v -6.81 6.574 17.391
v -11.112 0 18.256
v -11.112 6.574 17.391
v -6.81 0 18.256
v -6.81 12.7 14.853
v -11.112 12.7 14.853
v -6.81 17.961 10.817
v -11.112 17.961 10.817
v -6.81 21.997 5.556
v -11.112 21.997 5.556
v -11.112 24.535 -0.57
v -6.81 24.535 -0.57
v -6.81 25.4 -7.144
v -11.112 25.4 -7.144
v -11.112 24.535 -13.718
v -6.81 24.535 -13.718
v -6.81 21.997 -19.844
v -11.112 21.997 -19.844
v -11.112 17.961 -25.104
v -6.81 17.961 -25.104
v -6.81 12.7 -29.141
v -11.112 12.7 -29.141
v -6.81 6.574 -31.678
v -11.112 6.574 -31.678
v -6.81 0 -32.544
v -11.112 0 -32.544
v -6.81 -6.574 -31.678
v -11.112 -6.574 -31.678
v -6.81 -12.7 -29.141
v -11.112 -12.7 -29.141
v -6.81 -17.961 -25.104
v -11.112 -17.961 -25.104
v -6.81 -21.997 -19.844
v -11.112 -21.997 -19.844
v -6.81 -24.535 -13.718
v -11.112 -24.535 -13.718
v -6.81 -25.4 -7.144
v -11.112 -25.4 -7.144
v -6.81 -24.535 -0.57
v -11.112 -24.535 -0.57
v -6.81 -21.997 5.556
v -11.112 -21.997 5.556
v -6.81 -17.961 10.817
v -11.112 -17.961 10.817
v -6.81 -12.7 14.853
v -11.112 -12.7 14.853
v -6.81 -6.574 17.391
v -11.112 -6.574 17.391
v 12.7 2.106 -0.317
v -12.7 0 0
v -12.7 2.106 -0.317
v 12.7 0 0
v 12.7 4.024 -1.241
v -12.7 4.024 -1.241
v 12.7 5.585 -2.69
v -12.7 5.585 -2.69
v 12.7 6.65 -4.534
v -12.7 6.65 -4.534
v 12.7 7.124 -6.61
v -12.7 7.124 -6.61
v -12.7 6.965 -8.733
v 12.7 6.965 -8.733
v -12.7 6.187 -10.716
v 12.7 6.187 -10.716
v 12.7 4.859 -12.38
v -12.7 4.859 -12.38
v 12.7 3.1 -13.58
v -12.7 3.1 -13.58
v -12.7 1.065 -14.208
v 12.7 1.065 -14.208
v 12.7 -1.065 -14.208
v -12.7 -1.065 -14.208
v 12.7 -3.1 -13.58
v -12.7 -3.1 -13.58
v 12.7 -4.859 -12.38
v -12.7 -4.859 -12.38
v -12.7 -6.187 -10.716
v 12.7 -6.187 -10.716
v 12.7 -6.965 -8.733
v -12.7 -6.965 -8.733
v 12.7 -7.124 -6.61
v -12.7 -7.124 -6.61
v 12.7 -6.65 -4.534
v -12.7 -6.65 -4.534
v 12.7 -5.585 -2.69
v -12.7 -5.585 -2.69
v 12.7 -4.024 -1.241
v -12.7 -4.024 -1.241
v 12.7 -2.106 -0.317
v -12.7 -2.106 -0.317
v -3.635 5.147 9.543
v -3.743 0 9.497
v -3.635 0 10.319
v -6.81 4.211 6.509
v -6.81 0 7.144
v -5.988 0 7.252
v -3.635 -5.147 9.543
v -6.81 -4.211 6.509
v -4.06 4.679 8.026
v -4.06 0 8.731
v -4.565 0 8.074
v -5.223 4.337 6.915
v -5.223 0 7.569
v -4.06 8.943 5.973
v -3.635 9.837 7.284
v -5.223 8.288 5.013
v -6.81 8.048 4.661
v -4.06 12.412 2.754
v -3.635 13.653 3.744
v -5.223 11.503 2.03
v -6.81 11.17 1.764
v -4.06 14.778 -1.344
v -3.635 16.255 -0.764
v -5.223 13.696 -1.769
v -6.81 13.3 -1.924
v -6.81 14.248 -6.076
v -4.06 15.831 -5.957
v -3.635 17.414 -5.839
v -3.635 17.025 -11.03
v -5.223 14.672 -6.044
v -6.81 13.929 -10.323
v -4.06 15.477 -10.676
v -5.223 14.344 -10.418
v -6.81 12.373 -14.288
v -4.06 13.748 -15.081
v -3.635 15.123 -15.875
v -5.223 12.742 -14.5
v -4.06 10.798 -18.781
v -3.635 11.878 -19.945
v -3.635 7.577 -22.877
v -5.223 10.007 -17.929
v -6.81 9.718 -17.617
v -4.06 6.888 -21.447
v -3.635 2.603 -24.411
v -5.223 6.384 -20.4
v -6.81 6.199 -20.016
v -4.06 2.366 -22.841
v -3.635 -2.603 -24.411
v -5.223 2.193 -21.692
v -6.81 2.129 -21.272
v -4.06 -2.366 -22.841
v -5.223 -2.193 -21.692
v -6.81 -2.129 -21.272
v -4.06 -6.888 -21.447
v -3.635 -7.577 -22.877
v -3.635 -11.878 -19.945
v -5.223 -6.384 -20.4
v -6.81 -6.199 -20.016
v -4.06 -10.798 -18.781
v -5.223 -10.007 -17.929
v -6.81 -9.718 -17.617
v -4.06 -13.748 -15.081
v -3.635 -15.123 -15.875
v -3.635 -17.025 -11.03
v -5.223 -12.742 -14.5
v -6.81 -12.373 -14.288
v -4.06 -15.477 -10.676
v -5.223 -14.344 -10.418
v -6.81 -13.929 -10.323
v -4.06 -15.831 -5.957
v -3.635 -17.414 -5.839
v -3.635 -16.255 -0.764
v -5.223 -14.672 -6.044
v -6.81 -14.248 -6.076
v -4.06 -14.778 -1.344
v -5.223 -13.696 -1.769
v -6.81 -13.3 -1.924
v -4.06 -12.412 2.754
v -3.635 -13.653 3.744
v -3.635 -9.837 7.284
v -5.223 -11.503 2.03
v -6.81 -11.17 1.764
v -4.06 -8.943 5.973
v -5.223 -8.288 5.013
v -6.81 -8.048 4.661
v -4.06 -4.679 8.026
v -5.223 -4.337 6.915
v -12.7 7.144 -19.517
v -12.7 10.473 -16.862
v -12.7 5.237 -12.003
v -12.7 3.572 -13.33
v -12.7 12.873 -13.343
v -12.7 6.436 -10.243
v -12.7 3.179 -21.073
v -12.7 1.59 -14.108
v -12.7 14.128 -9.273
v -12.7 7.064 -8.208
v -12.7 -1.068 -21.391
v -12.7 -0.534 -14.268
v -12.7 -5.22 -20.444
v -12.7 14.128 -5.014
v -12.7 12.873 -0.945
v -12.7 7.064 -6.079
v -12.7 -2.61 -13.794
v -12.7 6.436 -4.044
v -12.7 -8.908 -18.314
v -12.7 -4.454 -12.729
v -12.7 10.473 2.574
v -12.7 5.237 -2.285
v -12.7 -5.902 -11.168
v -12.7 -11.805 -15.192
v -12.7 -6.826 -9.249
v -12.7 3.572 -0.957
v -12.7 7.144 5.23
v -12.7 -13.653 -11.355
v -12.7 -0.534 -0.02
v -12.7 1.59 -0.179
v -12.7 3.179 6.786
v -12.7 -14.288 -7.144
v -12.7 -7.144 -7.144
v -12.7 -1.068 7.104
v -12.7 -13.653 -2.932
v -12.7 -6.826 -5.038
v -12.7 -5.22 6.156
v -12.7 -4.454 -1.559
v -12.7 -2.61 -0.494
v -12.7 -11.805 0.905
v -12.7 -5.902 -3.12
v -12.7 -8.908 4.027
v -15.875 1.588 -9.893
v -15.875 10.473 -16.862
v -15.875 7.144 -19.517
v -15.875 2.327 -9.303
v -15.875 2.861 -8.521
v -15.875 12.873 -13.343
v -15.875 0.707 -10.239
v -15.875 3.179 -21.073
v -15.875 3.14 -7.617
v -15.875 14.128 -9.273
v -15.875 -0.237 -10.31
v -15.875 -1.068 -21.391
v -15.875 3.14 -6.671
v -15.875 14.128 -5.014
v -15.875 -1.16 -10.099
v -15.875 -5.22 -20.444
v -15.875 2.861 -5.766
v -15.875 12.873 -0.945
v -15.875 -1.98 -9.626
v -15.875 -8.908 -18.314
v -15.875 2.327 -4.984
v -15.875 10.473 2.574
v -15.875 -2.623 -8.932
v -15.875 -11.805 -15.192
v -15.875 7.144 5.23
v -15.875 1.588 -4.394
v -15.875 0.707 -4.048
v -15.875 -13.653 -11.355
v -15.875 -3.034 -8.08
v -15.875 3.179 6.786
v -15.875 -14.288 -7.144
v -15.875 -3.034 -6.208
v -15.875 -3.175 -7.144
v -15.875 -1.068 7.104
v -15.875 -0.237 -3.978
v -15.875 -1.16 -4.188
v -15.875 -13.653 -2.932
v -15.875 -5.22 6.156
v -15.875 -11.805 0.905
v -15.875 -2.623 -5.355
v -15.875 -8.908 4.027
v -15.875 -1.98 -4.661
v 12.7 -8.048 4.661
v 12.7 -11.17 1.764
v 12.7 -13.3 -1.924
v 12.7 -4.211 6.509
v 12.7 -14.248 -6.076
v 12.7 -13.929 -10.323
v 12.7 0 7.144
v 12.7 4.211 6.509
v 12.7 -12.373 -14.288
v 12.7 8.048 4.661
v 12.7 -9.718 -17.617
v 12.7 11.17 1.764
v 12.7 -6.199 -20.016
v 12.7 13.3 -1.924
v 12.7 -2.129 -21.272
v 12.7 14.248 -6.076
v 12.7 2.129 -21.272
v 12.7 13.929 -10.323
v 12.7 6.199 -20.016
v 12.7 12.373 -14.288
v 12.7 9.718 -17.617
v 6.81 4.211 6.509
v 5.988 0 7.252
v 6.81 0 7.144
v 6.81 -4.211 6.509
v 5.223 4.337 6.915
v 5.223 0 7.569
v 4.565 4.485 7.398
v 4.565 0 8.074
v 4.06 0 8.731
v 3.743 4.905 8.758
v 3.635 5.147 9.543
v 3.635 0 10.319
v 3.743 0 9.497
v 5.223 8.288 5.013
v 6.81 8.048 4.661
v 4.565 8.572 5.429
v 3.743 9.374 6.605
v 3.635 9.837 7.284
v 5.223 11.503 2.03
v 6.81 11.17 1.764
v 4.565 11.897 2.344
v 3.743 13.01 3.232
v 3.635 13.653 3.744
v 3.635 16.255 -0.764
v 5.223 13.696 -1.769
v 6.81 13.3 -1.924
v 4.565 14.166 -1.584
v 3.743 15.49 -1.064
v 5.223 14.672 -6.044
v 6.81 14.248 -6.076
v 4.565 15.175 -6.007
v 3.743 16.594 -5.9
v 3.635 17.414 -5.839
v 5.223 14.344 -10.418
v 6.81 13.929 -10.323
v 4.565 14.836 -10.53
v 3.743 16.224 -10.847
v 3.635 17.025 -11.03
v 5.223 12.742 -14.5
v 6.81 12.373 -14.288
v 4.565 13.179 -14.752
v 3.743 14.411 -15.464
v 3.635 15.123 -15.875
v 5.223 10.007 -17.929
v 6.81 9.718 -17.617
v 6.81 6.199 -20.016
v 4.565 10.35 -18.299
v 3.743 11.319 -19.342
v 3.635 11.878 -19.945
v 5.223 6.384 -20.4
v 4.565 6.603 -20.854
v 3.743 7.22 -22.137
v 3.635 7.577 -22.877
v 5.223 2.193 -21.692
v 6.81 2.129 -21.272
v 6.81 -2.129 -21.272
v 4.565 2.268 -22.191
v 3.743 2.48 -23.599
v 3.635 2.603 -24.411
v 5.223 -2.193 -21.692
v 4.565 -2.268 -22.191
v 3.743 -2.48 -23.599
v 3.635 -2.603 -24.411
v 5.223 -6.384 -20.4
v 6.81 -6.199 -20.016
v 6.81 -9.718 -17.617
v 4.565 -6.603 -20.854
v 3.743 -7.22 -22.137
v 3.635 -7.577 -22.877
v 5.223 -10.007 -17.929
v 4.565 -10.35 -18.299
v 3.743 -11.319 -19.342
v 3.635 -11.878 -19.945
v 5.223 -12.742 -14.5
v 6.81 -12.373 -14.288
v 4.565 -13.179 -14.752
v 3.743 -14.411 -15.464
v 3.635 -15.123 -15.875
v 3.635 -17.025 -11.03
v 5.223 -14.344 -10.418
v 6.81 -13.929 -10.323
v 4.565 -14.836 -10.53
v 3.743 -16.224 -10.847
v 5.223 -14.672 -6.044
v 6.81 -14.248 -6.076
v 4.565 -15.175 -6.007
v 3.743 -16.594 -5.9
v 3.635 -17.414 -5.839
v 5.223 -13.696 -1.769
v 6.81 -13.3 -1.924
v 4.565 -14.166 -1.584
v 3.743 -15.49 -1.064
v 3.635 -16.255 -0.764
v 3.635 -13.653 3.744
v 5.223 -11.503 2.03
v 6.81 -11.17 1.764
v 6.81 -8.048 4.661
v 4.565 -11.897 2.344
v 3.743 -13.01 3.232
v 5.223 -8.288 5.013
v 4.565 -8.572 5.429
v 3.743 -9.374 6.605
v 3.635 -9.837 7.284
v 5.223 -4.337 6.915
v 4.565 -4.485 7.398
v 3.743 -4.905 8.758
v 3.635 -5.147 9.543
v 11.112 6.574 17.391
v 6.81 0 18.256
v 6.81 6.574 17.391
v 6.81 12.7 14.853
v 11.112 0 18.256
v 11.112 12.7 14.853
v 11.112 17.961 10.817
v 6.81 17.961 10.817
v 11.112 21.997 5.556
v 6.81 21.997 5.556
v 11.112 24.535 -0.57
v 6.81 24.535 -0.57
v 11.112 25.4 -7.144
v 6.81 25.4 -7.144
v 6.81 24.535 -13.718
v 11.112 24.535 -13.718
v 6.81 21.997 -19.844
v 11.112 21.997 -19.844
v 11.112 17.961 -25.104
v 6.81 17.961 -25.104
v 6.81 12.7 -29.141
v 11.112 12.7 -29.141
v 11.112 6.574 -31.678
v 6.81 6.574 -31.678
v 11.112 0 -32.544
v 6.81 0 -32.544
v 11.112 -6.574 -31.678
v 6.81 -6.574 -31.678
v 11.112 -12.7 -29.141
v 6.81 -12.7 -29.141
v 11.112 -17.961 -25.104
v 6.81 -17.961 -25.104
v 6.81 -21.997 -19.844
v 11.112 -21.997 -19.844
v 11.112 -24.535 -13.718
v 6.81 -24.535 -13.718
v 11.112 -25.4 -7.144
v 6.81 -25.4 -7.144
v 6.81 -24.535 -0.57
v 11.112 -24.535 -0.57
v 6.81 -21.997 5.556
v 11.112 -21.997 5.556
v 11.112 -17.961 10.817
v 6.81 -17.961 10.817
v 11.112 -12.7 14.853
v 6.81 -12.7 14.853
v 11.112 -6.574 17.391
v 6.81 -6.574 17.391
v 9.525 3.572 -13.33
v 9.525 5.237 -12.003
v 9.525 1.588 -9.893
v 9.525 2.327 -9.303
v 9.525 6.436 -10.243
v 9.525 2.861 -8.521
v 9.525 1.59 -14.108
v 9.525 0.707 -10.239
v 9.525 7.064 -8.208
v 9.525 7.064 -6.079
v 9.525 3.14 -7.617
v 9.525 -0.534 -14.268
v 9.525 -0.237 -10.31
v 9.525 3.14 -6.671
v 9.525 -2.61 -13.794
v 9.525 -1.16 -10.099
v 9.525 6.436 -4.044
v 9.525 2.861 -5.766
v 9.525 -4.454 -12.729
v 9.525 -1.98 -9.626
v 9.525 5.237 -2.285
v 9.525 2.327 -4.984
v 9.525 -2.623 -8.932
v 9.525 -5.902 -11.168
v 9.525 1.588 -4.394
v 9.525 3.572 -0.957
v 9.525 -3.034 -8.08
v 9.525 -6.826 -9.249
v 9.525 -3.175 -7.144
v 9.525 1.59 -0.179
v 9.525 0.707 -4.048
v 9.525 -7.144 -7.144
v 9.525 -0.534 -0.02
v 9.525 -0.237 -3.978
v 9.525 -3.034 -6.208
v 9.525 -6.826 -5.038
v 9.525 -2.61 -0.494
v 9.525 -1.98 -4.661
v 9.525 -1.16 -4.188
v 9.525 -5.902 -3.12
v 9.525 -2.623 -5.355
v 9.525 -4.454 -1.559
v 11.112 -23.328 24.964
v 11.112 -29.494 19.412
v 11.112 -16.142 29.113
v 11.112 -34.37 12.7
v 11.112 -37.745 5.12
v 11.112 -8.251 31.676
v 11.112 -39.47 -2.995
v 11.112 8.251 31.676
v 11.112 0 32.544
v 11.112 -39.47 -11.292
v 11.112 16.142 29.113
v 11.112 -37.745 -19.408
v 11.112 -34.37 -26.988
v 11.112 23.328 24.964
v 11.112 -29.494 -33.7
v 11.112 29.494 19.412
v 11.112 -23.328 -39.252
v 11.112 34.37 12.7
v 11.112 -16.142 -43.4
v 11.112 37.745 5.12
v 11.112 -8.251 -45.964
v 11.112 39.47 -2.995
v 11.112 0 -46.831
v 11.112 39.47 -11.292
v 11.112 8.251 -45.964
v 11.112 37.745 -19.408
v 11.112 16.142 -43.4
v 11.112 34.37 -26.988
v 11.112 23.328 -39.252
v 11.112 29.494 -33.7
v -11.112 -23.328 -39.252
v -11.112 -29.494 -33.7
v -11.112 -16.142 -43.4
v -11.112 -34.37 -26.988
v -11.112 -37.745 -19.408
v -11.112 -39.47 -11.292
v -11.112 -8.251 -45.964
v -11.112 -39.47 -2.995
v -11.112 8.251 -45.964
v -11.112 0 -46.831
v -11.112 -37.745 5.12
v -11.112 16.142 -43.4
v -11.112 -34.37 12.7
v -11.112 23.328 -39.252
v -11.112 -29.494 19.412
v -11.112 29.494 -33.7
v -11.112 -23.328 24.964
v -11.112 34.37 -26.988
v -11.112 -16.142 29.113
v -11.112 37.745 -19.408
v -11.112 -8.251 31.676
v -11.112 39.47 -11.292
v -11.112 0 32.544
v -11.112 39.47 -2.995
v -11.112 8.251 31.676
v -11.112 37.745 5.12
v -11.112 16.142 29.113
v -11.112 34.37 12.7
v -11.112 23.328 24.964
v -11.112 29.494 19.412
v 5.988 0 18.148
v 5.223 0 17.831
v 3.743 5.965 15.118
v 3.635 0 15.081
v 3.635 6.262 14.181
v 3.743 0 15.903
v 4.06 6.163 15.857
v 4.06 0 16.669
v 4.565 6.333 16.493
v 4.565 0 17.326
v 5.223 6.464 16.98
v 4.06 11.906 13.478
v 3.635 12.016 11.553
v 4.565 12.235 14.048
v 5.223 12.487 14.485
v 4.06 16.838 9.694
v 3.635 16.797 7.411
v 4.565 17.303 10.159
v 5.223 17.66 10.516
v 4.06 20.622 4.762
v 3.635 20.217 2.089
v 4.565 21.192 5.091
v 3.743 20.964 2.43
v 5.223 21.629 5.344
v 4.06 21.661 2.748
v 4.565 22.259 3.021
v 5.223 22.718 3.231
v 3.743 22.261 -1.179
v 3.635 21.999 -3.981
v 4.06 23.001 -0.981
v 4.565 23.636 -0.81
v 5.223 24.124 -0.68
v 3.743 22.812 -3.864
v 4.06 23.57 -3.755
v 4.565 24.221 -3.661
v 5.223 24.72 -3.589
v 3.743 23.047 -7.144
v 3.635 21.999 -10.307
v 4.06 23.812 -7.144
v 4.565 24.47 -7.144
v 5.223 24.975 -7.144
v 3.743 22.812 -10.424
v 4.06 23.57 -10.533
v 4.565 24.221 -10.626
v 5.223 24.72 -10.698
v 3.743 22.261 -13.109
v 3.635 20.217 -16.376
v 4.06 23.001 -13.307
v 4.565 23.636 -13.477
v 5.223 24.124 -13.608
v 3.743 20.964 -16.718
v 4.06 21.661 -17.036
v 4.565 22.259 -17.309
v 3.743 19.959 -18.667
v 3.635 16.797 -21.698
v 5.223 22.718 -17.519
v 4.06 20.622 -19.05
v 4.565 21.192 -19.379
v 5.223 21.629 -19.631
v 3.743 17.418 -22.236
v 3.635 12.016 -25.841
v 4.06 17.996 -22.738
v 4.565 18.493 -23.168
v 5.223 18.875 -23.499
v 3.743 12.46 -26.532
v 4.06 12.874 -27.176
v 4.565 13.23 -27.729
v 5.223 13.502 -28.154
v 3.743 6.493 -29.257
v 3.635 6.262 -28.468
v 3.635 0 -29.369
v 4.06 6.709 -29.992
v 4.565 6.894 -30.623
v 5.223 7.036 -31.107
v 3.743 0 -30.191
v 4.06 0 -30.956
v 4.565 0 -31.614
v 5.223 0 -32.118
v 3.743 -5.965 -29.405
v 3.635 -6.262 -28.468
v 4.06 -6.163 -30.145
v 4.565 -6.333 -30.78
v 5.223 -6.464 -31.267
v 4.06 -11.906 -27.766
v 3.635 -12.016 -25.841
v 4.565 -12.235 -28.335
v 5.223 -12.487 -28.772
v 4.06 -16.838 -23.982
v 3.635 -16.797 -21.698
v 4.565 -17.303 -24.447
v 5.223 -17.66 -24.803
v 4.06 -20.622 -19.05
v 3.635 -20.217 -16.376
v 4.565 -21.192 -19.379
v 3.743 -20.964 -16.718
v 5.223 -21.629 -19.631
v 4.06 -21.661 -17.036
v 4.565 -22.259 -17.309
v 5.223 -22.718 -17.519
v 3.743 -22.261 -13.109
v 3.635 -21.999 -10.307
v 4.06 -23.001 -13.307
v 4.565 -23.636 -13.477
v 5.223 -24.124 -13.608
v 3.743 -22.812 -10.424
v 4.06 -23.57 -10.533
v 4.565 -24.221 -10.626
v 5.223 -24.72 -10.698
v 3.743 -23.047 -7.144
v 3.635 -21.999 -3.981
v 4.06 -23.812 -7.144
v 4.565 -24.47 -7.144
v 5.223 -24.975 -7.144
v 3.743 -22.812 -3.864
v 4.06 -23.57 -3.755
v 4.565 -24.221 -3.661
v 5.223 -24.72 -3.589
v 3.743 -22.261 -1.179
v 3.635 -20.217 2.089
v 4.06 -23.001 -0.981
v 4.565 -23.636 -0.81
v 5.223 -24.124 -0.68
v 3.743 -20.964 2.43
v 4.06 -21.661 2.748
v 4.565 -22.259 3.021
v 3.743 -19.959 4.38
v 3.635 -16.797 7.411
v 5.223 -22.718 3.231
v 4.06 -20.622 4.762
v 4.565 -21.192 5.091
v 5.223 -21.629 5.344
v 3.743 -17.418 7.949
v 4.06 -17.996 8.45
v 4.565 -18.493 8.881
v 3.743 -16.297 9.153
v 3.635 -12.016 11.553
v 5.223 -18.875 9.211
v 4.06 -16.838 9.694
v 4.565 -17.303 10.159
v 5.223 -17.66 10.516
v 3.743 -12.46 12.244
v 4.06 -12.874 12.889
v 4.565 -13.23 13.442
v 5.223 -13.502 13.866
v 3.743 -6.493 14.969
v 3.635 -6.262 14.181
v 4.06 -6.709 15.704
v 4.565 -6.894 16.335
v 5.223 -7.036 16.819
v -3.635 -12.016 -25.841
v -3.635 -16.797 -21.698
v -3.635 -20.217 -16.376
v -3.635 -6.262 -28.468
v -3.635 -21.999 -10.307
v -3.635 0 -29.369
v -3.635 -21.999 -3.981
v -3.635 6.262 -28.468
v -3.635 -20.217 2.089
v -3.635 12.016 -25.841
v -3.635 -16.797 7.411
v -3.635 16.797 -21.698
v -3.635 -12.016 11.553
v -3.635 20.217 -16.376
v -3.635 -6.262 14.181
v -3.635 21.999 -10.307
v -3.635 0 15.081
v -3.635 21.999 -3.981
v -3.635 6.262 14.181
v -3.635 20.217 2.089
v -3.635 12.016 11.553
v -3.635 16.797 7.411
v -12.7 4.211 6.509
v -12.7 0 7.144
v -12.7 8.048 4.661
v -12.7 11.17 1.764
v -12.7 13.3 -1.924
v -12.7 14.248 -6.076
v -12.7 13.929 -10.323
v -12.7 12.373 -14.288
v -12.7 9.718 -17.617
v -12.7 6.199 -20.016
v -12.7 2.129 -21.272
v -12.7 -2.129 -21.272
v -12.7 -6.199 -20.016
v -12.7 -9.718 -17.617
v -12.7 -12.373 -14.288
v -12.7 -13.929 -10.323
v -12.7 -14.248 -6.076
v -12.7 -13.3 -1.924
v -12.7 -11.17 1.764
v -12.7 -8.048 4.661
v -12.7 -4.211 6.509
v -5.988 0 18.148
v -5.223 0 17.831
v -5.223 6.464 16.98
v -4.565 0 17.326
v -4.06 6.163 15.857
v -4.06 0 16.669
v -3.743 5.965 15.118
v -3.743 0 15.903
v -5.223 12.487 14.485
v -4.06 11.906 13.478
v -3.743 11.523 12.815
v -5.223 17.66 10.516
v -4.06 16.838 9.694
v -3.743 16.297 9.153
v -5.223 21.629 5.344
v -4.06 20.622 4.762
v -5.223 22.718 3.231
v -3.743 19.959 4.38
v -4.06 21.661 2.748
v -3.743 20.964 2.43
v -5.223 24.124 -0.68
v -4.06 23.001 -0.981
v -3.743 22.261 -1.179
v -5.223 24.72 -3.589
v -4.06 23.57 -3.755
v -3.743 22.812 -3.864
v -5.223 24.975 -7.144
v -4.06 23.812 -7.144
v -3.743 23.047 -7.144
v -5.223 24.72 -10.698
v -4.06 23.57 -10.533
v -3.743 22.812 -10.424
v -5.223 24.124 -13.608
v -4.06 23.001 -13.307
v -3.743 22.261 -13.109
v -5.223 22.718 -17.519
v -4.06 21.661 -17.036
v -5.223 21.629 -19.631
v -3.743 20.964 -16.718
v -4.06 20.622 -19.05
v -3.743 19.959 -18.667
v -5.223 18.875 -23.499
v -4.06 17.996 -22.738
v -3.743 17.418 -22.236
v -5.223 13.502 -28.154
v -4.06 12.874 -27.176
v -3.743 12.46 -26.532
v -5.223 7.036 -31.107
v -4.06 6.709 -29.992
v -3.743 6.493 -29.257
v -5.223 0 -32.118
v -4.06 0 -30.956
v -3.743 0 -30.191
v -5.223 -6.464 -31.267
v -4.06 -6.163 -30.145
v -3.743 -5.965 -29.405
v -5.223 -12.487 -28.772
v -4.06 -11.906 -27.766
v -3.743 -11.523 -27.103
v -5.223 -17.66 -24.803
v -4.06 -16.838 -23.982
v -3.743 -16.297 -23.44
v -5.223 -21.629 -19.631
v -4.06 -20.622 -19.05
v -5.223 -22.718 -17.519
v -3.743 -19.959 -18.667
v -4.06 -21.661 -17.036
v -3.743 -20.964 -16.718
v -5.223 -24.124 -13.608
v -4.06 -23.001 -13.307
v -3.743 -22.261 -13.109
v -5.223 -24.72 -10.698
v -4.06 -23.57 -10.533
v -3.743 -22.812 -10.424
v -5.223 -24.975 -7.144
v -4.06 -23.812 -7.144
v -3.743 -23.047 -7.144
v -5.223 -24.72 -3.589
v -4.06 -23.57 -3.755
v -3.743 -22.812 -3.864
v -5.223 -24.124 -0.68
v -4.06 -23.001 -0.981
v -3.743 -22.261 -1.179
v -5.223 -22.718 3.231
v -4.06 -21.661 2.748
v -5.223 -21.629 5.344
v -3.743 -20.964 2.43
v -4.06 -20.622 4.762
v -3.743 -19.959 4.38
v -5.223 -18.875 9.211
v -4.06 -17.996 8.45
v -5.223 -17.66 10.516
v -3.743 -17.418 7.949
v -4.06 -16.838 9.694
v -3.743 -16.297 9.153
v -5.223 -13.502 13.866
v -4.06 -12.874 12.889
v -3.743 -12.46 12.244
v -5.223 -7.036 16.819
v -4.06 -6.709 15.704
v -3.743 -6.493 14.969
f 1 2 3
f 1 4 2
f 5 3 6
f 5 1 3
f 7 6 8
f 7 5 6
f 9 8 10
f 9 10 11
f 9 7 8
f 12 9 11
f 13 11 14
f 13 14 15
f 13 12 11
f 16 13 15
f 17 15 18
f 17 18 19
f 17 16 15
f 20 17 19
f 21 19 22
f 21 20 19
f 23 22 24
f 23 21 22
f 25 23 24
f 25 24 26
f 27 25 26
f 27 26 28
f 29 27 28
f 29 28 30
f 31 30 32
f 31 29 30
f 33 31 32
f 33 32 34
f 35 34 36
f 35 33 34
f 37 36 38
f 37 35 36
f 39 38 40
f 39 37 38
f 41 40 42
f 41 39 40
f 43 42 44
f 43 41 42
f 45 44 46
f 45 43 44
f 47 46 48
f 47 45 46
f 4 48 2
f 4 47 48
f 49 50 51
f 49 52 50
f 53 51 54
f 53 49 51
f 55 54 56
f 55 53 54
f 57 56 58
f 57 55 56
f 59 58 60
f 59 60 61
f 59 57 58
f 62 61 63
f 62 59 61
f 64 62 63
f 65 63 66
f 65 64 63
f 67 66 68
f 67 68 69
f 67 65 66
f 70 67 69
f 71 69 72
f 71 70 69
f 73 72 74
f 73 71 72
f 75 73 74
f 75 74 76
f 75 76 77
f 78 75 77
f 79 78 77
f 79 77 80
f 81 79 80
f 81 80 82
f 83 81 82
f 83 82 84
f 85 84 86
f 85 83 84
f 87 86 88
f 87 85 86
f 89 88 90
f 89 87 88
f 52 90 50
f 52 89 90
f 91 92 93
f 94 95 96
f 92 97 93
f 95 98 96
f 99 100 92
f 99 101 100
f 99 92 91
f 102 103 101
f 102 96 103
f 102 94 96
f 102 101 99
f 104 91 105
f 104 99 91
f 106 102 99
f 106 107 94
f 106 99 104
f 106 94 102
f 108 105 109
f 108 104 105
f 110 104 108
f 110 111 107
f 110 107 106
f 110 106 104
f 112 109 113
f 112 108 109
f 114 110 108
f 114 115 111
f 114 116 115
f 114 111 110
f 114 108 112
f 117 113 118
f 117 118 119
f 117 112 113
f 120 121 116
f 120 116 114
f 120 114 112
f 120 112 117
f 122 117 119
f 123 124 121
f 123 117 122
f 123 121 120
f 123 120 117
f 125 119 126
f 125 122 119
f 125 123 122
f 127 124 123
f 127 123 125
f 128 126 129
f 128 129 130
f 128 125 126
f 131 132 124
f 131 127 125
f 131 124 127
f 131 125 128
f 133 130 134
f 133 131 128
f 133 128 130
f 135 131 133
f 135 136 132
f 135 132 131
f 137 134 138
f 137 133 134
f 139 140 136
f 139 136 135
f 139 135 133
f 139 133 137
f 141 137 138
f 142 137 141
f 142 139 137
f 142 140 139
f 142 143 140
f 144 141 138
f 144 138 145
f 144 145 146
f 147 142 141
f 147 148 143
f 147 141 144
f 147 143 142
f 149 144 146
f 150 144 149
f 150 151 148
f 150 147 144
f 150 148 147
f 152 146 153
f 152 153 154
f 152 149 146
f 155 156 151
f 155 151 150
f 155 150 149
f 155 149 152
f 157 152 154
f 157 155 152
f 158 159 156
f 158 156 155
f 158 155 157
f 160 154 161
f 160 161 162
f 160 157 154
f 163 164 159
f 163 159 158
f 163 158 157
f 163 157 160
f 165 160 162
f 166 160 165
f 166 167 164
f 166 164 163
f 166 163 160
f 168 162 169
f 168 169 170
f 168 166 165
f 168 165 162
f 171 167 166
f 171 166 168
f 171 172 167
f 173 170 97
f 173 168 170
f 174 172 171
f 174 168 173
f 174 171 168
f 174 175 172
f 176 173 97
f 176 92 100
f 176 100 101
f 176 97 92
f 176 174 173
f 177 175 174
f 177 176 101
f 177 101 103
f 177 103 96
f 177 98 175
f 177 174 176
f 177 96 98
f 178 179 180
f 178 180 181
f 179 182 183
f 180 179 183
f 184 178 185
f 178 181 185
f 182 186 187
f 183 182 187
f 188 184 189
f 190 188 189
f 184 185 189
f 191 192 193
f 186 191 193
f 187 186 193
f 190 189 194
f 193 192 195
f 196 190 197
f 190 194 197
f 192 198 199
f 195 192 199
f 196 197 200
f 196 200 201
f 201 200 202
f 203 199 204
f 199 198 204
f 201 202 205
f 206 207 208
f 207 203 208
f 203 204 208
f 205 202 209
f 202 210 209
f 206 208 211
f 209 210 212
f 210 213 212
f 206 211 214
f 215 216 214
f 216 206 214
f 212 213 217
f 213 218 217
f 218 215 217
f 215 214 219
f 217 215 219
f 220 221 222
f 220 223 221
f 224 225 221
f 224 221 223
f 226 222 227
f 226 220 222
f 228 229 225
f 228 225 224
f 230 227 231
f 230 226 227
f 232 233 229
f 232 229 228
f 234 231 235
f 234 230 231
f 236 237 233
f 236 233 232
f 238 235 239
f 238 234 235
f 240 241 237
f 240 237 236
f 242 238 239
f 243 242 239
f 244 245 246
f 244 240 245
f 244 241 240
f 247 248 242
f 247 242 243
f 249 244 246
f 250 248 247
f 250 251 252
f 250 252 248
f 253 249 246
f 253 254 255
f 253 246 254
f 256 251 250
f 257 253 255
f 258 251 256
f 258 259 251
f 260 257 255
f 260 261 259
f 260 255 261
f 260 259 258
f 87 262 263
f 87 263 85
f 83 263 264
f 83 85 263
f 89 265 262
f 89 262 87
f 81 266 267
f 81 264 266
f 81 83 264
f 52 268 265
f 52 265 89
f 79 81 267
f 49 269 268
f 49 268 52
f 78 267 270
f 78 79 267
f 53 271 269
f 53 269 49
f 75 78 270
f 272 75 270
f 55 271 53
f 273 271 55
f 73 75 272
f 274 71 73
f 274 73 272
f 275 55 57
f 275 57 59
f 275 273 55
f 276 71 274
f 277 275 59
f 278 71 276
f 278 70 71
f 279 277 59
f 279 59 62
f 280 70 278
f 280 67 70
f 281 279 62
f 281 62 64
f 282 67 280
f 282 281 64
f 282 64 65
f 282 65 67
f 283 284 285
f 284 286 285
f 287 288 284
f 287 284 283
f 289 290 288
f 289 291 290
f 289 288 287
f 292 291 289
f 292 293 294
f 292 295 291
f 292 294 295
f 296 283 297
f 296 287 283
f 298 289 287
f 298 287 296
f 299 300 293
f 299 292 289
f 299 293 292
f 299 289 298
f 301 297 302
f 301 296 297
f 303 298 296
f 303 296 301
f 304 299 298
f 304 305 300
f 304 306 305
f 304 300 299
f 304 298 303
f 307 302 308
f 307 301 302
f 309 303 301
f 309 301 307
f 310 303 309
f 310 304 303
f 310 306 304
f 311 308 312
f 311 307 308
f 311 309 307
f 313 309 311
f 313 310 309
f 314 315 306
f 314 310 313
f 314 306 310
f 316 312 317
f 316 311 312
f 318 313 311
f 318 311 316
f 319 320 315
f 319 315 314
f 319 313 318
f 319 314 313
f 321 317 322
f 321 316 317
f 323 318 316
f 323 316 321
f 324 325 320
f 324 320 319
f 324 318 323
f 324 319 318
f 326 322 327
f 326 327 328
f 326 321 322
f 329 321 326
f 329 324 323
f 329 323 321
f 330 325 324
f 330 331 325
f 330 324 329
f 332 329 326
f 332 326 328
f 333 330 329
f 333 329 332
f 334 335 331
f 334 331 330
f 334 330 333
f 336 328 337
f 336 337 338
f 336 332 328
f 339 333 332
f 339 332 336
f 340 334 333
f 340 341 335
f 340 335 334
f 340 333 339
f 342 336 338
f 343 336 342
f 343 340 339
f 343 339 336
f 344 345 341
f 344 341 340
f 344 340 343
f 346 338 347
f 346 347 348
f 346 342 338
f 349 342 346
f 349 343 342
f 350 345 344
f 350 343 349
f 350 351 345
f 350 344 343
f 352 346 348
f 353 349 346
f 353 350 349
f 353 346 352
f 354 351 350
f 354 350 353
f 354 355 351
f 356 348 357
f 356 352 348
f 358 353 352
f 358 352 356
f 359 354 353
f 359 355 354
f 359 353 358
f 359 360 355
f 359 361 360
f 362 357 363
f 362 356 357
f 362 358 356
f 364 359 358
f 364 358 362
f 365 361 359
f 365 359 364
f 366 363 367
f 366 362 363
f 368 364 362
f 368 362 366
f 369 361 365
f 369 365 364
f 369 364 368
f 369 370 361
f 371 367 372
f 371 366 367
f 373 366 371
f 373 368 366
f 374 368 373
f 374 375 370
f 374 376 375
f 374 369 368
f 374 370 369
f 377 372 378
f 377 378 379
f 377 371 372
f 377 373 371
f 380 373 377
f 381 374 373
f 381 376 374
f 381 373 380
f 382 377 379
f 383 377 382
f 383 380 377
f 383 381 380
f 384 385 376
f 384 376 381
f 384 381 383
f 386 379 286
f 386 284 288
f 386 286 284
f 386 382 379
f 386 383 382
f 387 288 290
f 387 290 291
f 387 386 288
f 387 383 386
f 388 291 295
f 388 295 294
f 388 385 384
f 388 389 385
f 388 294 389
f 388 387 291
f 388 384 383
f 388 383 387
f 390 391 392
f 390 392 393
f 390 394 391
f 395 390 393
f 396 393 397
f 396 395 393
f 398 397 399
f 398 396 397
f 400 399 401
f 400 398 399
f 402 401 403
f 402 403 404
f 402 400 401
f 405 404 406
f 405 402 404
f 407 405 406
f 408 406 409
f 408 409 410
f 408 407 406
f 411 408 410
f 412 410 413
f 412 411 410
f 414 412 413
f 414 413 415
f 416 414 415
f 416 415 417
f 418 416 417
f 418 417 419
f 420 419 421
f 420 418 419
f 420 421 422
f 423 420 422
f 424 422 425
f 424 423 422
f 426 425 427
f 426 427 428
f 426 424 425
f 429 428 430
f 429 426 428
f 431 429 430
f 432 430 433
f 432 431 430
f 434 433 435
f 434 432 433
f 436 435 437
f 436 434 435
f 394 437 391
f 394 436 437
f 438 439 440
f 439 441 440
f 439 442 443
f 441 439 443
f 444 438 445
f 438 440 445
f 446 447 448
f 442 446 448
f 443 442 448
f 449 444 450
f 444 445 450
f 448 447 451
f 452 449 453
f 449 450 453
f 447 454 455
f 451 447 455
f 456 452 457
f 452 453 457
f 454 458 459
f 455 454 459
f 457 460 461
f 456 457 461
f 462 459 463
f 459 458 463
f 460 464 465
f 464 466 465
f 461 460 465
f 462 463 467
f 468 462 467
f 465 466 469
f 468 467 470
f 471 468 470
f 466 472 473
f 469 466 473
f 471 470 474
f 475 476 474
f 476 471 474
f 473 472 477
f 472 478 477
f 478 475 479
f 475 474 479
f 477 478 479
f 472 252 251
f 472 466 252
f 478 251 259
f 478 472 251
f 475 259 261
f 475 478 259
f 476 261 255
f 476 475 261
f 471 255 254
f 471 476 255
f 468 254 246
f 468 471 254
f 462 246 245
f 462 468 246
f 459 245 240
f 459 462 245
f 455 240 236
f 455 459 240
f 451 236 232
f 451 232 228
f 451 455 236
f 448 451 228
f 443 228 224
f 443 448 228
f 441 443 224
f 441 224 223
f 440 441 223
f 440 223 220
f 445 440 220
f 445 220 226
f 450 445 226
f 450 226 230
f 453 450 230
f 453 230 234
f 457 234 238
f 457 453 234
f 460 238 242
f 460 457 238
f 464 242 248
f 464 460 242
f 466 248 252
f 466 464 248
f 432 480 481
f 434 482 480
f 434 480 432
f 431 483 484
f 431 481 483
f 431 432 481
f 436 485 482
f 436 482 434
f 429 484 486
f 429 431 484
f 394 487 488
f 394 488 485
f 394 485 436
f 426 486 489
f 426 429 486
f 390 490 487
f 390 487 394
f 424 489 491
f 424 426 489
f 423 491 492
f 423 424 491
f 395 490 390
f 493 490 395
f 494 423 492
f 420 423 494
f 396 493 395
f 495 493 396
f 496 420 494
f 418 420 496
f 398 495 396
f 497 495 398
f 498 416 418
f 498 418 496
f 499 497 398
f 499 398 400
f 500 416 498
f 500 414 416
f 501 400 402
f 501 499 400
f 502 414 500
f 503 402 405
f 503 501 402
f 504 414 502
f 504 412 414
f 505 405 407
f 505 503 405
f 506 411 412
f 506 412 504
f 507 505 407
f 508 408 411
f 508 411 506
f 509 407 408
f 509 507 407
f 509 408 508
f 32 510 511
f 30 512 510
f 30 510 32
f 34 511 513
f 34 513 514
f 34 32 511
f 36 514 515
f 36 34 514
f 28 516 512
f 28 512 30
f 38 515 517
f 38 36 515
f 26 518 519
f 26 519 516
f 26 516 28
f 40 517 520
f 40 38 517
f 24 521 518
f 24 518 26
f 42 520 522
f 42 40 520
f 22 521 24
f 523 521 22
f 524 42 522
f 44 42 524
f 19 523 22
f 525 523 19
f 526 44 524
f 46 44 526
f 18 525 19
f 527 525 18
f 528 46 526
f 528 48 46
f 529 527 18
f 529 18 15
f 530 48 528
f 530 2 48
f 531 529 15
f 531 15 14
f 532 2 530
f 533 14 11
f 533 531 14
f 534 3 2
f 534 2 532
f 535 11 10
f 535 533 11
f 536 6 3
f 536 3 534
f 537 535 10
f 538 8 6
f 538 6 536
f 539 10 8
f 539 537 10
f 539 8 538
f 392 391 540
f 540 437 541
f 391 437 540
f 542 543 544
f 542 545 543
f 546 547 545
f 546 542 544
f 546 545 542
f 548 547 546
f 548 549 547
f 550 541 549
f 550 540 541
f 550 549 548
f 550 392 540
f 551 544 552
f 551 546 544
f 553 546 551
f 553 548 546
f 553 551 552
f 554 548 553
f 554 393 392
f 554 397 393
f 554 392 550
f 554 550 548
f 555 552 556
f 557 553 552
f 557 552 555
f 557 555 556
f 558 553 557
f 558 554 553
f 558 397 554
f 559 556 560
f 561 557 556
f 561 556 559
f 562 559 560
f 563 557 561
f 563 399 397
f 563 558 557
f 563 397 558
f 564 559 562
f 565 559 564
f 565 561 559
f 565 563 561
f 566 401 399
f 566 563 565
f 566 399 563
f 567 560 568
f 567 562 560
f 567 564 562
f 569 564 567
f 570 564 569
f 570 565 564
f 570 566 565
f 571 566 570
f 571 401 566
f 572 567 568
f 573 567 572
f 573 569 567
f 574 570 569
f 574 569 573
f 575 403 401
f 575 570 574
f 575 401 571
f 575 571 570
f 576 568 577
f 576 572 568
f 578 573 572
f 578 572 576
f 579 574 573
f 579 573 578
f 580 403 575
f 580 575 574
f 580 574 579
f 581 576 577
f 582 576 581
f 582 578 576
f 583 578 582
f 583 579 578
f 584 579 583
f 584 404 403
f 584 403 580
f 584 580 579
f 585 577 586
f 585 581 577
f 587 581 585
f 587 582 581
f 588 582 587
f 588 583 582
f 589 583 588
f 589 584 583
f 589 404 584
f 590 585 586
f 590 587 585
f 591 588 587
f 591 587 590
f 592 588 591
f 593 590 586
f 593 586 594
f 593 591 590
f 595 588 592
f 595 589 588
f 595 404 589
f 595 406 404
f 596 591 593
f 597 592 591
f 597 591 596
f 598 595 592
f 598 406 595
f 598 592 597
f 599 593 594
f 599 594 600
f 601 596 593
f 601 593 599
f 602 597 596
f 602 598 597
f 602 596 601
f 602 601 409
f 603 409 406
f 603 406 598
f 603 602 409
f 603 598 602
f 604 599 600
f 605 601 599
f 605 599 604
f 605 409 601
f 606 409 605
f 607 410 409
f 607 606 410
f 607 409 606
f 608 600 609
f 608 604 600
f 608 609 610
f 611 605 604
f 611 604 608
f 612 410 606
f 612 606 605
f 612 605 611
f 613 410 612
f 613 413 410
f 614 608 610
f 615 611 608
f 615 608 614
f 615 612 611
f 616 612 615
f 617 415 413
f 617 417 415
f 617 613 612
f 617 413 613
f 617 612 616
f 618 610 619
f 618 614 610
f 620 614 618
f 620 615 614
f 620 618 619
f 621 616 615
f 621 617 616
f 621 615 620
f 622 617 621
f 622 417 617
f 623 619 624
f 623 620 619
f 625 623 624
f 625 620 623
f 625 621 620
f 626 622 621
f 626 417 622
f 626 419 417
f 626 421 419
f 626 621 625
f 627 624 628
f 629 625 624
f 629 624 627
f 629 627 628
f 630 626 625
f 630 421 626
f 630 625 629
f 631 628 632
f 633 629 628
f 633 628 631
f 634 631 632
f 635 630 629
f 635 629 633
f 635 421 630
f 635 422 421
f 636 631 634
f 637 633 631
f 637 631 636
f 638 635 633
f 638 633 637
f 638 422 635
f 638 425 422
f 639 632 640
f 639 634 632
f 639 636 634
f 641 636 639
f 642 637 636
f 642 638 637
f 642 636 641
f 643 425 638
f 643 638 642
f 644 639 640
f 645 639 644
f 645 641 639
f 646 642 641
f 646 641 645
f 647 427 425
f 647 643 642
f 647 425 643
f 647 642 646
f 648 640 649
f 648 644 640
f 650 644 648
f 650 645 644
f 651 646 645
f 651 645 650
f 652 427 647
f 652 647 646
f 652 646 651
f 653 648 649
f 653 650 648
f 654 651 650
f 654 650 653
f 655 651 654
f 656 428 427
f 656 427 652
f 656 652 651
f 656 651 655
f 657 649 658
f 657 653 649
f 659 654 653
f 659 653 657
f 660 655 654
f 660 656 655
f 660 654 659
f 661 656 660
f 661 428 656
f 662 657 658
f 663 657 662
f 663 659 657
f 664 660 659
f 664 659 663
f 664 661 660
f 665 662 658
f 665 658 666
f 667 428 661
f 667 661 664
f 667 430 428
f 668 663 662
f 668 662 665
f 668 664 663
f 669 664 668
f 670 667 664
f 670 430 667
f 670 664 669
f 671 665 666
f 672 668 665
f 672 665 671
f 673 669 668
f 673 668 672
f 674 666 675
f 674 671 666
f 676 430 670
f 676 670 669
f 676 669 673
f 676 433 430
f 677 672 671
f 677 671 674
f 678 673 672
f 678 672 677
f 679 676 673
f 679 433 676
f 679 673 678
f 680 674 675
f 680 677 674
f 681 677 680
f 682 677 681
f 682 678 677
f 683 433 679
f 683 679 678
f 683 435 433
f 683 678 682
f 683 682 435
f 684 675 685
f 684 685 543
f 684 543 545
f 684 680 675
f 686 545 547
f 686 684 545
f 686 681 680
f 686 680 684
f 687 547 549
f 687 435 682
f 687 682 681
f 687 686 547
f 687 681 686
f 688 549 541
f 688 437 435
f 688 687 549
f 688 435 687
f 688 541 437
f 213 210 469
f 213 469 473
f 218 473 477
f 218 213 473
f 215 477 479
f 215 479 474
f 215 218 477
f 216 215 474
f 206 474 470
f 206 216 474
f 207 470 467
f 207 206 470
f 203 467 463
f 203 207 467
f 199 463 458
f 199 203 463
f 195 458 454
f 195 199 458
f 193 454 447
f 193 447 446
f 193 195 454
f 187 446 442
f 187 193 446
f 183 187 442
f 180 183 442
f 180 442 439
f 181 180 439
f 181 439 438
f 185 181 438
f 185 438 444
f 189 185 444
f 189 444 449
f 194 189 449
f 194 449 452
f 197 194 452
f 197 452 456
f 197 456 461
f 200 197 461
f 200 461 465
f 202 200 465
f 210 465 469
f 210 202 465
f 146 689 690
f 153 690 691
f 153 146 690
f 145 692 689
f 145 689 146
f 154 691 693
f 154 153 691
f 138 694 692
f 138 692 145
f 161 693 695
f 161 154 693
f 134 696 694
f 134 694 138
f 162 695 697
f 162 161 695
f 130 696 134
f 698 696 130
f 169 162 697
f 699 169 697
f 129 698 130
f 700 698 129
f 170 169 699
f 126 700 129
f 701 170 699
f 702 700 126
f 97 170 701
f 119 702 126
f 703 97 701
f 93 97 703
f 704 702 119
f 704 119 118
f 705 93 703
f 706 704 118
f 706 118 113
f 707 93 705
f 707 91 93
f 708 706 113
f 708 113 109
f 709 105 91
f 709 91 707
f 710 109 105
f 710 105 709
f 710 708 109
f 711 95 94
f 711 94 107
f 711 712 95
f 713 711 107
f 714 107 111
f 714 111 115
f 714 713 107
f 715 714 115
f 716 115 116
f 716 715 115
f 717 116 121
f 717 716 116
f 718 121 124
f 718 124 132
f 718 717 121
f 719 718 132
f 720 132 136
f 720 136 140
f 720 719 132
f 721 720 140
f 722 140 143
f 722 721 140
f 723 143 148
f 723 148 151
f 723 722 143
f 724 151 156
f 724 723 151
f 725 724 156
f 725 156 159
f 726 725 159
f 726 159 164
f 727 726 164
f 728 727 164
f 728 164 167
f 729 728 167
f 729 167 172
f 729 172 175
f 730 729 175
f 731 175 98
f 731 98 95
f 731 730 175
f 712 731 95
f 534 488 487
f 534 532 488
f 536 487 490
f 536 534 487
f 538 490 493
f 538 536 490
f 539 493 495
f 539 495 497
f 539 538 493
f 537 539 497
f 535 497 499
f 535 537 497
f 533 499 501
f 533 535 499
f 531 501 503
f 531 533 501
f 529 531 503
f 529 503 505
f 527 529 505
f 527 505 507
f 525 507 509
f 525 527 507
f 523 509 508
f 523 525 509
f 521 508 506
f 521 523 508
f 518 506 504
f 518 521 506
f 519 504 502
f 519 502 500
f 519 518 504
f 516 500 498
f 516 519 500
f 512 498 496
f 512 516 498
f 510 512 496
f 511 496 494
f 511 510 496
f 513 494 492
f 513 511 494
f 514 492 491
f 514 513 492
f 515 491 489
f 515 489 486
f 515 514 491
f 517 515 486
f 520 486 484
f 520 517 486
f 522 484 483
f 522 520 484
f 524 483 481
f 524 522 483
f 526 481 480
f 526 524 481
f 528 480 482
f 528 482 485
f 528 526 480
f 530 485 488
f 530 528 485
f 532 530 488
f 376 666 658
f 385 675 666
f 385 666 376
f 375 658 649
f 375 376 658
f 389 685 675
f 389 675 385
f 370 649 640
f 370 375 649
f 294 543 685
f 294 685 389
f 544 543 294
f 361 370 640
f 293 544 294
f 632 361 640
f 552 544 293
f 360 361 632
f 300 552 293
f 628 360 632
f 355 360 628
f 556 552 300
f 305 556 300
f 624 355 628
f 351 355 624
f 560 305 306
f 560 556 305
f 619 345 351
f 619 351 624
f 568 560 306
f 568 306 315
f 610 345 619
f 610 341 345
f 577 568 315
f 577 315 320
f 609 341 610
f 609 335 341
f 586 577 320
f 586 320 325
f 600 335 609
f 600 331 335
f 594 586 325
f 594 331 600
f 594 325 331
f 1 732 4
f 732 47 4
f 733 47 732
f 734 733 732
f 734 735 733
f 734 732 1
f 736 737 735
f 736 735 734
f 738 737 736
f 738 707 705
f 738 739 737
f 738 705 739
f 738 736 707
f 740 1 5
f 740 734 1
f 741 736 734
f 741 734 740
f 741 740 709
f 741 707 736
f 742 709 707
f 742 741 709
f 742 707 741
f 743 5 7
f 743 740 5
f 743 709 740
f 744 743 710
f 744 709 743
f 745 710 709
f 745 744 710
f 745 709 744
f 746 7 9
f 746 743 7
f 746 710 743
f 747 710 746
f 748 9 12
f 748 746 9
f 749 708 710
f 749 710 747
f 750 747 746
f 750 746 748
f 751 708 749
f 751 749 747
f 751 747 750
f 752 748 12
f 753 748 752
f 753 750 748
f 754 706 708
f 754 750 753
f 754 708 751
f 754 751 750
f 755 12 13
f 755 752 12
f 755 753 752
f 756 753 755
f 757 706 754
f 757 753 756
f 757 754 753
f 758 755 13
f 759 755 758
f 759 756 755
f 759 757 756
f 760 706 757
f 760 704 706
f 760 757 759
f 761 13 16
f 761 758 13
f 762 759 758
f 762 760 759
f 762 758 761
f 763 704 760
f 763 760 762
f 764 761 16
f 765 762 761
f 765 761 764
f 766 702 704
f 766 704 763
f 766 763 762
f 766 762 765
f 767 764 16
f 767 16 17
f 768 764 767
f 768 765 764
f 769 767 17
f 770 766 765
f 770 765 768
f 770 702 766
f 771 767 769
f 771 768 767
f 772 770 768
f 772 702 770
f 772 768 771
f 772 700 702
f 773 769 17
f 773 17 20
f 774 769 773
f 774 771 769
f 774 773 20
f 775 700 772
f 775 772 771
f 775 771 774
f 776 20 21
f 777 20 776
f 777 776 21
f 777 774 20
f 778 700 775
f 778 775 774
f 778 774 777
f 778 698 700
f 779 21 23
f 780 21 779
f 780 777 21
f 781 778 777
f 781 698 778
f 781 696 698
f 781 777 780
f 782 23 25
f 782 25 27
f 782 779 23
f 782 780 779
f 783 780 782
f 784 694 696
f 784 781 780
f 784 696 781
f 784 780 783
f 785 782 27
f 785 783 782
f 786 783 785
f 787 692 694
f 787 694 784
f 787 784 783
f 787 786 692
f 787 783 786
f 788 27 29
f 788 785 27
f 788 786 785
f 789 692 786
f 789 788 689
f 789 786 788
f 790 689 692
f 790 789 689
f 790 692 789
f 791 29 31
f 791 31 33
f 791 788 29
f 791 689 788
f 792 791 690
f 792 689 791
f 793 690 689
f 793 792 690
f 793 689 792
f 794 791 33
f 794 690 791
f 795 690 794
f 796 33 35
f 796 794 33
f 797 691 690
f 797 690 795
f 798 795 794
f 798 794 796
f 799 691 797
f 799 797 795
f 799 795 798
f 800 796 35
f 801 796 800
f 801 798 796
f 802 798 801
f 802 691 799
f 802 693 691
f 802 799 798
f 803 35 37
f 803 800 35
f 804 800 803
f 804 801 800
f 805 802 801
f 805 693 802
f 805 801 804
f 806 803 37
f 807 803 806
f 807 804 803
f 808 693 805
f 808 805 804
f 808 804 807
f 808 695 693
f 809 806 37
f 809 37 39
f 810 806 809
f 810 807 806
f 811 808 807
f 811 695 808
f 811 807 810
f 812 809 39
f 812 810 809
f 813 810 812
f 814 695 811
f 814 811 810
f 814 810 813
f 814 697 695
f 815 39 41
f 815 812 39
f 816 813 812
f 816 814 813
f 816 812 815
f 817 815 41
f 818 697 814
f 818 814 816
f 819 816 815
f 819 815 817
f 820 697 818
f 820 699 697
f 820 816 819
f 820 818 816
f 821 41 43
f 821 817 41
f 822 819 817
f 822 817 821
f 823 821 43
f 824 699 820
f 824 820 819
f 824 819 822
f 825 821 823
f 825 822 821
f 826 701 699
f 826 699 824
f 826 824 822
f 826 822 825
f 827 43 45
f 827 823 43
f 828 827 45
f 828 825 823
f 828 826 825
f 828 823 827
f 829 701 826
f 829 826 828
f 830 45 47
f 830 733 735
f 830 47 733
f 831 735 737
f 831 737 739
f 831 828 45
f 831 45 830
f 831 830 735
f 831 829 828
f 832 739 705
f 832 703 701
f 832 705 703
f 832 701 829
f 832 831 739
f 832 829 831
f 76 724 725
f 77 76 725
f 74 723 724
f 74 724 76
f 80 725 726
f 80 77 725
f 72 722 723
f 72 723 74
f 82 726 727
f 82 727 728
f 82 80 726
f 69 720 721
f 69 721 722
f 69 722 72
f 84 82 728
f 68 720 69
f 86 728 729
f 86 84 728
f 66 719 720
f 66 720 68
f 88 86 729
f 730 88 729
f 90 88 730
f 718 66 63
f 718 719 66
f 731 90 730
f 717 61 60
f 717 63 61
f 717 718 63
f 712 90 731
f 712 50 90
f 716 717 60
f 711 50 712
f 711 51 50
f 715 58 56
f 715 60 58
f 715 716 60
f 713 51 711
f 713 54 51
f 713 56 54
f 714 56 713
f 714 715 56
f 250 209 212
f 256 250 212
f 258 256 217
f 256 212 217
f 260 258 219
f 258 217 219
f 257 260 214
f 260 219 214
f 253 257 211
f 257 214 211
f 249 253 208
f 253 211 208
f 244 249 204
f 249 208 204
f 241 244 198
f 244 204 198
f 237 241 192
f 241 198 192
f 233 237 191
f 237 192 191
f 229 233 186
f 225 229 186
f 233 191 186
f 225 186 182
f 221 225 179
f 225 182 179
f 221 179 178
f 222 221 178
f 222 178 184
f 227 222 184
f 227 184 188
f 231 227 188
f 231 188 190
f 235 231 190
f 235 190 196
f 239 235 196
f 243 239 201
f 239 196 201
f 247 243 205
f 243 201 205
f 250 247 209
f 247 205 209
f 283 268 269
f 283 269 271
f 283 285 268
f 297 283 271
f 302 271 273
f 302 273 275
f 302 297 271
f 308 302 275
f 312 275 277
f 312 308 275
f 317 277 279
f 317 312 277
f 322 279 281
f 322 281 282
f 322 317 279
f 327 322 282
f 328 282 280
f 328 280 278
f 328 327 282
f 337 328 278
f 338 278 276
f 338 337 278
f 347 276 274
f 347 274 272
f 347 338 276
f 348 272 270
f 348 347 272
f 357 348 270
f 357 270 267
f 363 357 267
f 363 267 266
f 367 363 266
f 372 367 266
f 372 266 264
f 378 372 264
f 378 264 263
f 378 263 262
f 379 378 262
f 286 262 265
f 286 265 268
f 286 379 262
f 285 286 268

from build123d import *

# Parameters (mm, degrees)
F2_R        = 7.14375
F2_R_2      = 3.175
F3_DEPTH    = 22.225
F1_FACE_R   = 14.2875
F1_FACE_R_2 = 7.14375
F3_FACE_R   = 7.14375
F3_FACE_R_2 = 3.175
F4_DEPTH    = 3.175


with BuildPart() as f1:
    # F0 (on Front) → F1 (revolve)
    with BuildSketch(Plane.XZ):
        with BuildLine():
            Line((-12.7, 0), (0, 0))
            Line((0, 0), (0, 32.54375))
            Line((0, 32.54375), (-11.1125, 32.54375))
            Line((-11.1125, 32.54375), (-11.1125, 18.25625))
            Line((-11.1125, 18.25625), (-6.8100053257, 18.25625))
            ThreePointArc((-6.8100053257, 18.25625), (-4.5649412955, 17.3263140303), (-3.6350053257, 15.08125))
            Line((-3.6350053257, 15.08125), (-3.6350053257, 10.31875))
            ThreePointArc((-3.6350053257, 10.31875), (-4.5649412955, 8.0736859697), (-6.8100053257, 7.14375))
            Line((-6.8100053257, 7.14375), (-12.7, 7.14375))
            Line((-12.7, 7.14375), (-12.7, 0))
        make_face()
        with BuildLine():
            Line((0, 32.54375), (0, 0))
            Line((0, 0), (12.7, 0))
            Line((12.7, 0), (12.7, 7.14375))
            Line((12.7, 7.14375), (6.8100053257, 7.14375))
            ThreePointArc((6.8100053257, 7.14375), (4.5649412955, 8.0736859697), (3.6350053257, 10.31875))
            Line((3.6350053257, 10.31875), (3.6350053257, 15.08125))
            ThreePointArc((3.6350053257, 15.08125), (4.5649412955, 17.3263140303), (6.8100053257, 18.25625))
            Line((6.8100053257, 18.25625), (11.1125, 18.25625))
            Line((11.1125, 18.25625), (11.1125, 32.54375))
            Line((11.1125, 32.54375), (0, 32.54375))
        make_face()
    revolve(axis=Axis((-12.7447592095, 0, -7.14375), (-1, 0, 0)))


with BuildPart() as f3:
    # F2 (on face) → F3 (new body)
    with BuildSketch(Plane(origin=(-12.7, 0, 0), x_dir=(0, -1, 0), z_dir=(-1, 0, 0))):
        with Locations((0, -7.14375)):
            Circle(F2_R)
        with Locations((0, -7.14375)):
            Circle(F2_R_2, mode=Mode.SUBTRACT)
    extrude(amount=-F3_DEPTH)

    # F1_face (on face) + F3_face (on face) → F4 (join)
    with BuildSketch(Plane(origin=(-12.7, 0, -7.14375), x_dir=(0, -1, 0), z_dir=(-1, 0, 0))):
        Circle(F1_FACE_R)
        Circle(F1_FACE_R_2, mode=Mode.SUBTRACT)
    with BuildSketch(Plane(origin=(-12.7, 0, -7.14375), x_dir=(0, -1, 0), z_dir=(-1, 0, 0))):
        Circle(F3_FACE_R)
        Circle(F3_FACE_R_2, mode=Mode.SUBTRACT)
    extrude(amount=F4_DEPTH)


solid = Compound([f1.part, f3.part])
